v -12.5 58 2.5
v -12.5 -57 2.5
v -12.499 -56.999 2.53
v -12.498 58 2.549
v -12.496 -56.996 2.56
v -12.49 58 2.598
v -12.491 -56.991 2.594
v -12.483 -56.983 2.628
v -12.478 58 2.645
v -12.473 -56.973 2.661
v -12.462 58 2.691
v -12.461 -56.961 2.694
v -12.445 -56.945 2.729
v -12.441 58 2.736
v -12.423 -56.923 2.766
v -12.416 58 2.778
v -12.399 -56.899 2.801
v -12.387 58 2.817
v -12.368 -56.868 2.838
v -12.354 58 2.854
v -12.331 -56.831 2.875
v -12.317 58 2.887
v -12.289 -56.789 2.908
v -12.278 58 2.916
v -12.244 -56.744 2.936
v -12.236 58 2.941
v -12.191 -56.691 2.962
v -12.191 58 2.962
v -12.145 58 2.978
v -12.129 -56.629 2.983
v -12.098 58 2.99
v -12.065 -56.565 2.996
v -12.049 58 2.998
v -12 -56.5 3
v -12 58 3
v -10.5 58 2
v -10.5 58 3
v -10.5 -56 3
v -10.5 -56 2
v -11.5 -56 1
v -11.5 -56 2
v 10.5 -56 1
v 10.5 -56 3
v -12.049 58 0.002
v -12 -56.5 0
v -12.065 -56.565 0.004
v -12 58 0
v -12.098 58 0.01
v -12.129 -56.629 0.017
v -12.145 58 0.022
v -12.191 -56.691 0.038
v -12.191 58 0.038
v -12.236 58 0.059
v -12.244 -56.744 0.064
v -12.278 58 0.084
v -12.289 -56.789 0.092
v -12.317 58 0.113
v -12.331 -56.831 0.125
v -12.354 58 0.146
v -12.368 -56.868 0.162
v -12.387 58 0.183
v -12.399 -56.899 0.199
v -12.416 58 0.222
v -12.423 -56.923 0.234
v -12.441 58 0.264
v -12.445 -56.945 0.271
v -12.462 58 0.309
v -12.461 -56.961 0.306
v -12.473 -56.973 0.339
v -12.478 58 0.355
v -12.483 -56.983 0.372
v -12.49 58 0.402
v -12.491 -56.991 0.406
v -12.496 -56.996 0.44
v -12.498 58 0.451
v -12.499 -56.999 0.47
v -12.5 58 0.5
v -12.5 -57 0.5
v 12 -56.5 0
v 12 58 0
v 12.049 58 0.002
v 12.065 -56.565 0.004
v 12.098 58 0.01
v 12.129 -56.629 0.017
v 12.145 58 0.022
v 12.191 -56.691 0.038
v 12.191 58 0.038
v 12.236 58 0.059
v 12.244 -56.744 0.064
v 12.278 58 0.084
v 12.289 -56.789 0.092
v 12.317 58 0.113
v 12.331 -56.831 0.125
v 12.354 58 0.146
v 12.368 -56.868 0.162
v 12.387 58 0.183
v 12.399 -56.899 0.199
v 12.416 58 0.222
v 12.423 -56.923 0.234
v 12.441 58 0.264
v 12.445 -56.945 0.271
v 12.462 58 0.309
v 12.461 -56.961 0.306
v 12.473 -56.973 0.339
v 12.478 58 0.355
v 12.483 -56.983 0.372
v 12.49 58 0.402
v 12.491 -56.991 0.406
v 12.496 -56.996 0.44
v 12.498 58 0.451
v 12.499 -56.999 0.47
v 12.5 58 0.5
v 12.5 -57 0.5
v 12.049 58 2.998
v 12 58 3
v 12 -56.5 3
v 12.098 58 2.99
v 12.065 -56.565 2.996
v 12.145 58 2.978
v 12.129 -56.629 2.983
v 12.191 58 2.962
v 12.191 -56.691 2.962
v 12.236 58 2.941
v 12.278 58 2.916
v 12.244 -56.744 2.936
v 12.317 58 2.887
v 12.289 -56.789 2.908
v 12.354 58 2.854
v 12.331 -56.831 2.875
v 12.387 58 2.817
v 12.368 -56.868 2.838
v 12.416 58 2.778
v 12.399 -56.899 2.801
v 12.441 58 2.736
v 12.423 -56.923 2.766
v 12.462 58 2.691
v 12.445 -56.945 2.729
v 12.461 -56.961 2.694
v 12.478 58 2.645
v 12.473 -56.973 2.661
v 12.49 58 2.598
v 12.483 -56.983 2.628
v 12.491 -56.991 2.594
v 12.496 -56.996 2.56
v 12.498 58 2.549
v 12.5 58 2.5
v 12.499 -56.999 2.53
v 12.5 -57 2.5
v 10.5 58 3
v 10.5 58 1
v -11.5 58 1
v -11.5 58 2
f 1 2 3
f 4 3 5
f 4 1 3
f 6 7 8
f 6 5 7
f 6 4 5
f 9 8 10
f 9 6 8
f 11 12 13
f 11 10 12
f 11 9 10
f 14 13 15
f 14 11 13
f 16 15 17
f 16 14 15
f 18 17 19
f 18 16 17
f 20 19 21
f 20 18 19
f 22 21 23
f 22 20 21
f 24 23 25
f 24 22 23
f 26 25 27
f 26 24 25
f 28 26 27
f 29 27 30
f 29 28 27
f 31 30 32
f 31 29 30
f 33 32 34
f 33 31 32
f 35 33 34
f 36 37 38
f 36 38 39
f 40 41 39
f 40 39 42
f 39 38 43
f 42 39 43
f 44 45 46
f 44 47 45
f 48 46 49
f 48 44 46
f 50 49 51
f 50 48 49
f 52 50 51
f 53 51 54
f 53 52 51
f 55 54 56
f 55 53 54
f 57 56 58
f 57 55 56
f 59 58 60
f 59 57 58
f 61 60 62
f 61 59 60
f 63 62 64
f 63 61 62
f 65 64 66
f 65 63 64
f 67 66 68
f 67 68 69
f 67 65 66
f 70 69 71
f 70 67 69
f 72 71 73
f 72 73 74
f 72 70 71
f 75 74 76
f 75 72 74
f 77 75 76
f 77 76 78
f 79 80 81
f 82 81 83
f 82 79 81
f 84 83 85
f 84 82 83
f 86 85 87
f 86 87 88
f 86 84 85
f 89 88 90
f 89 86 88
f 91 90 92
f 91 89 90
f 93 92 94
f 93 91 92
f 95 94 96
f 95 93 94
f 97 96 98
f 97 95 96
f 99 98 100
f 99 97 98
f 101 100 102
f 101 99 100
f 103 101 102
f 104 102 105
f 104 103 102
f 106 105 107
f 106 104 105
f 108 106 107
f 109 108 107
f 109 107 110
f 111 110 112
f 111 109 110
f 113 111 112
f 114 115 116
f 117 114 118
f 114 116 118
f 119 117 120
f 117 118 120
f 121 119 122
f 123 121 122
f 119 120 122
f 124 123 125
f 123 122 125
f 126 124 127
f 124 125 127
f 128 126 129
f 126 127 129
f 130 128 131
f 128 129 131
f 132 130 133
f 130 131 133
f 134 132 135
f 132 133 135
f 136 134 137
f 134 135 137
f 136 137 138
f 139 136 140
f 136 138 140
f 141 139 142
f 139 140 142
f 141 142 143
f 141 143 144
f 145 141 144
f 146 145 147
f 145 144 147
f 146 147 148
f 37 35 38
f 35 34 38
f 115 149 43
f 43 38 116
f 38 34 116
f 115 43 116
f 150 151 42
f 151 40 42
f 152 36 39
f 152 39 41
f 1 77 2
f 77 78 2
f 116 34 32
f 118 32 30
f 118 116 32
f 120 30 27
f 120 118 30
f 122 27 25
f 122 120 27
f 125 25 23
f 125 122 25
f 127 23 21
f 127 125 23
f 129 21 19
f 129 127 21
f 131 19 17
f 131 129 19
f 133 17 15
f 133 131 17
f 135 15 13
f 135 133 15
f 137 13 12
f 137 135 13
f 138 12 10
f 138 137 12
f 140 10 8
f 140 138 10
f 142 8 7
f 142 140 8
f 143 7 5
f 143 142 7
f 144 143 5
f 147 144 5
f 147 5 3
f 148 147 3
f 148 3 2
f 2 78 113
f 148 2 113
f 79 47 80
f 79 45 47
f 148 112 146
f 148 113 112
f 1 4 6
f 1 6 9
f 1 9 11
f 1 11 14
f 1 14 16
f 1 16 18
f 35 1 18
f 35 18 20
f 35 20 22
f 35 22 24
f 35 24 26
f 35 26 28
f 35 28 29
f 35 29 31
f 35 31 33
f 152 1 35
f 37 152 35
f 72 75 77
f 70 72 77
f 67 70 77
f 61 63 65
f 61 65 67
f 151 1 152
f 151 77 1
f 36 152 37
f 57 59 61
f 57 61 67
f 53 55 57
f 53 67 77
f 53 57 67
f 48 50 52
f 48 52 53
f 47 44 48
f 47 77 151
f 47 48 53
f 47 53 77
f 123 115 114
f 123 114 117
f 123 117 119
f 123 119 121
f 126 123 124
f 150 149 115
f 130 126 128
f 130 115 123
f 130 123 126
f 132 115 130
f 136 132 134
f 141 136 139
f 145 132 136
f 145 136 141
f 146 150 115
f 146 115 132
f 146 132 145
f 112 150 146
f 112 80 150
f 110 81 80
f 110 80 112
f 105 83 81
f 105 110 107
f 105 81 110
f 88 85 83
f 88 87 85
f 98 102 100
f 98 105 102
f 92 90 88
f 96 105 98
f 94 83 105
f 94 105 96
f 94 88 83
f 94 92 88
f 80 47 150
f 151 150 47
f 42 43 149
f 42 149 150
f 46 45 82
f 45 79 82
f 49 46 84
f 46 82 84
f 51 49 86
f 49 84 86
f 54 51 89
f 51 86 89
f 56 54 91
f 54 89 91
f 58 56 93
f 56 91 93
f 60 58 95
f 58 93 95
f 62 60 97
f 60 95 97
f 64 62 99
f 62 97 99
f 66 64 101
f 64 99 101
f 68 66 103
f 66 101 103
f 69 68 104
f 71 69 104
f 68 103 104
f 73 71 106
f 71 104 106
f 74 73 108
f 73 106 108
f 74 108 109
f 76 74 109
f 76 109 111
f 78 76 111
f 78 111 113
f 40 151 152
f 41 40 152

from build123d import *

# Parameters (mm, degrees)
F0_W     = 25
F0_H     = 114
F1_DEPTH = 3
F2_W     = 21
F2_H     = 113
F3_DEPTH = 2
F4_W     = 1
F4_H     = 1
F5_DEPTH = 113
F6_DEPTH = 1
F7_R     = 0.5


with BuildPart() as f1:
    # F0 (on Top) → F1 (new body)
    with BuildSketch(Plane.XY):
        Rectangle(F0_W, F0_H)
    extrude(amount=F1_DEPTH)

    # F2 (on face) → F3 (cut)
    with BuildSketch(Plane.XY.offset(3)):
        with Locations((0, 0.5)):
            Rectangle(F2_W, F2_H)
    extrude(amount=-F3_DEPTH, mode=Mode.SUBTRACT)

    # F4 (on face) → F5 (cut)
    with BuildSketch(Plane(origin=(0, 57, 0), x_dir=(-1, 0, 0), z_dir=(0, 1, 0))):
        with Locations((11, 1.5)):
            Rectangle(F4_W, F4_H)
    extrude(amount=-F5_DEPTH, mode=Mode.SUBTRACT)

    # F6 (add): a face of the model
    f6_faces = [f1.faces().sort_by_distance(p)[0] for p in [
        (0.34375, 57, 0.84375),
    ]]
    extrude(f6_faces, amount=F6_DEPTH)

    # F7
    f7_edges = [f1.edges().sort_by_distance(p)[0] for p in [
        (12.5, 0.5, 0),
        (12.5, 0.5, 3),
        (0, -57, 3),
        (0, -57, 0),
        (-12.5, 0.5, 3),
        (-12.5, 0.5, 0),
    ]]
    fillet(f7_edges, radius=F7_R)


solid = f1.part
